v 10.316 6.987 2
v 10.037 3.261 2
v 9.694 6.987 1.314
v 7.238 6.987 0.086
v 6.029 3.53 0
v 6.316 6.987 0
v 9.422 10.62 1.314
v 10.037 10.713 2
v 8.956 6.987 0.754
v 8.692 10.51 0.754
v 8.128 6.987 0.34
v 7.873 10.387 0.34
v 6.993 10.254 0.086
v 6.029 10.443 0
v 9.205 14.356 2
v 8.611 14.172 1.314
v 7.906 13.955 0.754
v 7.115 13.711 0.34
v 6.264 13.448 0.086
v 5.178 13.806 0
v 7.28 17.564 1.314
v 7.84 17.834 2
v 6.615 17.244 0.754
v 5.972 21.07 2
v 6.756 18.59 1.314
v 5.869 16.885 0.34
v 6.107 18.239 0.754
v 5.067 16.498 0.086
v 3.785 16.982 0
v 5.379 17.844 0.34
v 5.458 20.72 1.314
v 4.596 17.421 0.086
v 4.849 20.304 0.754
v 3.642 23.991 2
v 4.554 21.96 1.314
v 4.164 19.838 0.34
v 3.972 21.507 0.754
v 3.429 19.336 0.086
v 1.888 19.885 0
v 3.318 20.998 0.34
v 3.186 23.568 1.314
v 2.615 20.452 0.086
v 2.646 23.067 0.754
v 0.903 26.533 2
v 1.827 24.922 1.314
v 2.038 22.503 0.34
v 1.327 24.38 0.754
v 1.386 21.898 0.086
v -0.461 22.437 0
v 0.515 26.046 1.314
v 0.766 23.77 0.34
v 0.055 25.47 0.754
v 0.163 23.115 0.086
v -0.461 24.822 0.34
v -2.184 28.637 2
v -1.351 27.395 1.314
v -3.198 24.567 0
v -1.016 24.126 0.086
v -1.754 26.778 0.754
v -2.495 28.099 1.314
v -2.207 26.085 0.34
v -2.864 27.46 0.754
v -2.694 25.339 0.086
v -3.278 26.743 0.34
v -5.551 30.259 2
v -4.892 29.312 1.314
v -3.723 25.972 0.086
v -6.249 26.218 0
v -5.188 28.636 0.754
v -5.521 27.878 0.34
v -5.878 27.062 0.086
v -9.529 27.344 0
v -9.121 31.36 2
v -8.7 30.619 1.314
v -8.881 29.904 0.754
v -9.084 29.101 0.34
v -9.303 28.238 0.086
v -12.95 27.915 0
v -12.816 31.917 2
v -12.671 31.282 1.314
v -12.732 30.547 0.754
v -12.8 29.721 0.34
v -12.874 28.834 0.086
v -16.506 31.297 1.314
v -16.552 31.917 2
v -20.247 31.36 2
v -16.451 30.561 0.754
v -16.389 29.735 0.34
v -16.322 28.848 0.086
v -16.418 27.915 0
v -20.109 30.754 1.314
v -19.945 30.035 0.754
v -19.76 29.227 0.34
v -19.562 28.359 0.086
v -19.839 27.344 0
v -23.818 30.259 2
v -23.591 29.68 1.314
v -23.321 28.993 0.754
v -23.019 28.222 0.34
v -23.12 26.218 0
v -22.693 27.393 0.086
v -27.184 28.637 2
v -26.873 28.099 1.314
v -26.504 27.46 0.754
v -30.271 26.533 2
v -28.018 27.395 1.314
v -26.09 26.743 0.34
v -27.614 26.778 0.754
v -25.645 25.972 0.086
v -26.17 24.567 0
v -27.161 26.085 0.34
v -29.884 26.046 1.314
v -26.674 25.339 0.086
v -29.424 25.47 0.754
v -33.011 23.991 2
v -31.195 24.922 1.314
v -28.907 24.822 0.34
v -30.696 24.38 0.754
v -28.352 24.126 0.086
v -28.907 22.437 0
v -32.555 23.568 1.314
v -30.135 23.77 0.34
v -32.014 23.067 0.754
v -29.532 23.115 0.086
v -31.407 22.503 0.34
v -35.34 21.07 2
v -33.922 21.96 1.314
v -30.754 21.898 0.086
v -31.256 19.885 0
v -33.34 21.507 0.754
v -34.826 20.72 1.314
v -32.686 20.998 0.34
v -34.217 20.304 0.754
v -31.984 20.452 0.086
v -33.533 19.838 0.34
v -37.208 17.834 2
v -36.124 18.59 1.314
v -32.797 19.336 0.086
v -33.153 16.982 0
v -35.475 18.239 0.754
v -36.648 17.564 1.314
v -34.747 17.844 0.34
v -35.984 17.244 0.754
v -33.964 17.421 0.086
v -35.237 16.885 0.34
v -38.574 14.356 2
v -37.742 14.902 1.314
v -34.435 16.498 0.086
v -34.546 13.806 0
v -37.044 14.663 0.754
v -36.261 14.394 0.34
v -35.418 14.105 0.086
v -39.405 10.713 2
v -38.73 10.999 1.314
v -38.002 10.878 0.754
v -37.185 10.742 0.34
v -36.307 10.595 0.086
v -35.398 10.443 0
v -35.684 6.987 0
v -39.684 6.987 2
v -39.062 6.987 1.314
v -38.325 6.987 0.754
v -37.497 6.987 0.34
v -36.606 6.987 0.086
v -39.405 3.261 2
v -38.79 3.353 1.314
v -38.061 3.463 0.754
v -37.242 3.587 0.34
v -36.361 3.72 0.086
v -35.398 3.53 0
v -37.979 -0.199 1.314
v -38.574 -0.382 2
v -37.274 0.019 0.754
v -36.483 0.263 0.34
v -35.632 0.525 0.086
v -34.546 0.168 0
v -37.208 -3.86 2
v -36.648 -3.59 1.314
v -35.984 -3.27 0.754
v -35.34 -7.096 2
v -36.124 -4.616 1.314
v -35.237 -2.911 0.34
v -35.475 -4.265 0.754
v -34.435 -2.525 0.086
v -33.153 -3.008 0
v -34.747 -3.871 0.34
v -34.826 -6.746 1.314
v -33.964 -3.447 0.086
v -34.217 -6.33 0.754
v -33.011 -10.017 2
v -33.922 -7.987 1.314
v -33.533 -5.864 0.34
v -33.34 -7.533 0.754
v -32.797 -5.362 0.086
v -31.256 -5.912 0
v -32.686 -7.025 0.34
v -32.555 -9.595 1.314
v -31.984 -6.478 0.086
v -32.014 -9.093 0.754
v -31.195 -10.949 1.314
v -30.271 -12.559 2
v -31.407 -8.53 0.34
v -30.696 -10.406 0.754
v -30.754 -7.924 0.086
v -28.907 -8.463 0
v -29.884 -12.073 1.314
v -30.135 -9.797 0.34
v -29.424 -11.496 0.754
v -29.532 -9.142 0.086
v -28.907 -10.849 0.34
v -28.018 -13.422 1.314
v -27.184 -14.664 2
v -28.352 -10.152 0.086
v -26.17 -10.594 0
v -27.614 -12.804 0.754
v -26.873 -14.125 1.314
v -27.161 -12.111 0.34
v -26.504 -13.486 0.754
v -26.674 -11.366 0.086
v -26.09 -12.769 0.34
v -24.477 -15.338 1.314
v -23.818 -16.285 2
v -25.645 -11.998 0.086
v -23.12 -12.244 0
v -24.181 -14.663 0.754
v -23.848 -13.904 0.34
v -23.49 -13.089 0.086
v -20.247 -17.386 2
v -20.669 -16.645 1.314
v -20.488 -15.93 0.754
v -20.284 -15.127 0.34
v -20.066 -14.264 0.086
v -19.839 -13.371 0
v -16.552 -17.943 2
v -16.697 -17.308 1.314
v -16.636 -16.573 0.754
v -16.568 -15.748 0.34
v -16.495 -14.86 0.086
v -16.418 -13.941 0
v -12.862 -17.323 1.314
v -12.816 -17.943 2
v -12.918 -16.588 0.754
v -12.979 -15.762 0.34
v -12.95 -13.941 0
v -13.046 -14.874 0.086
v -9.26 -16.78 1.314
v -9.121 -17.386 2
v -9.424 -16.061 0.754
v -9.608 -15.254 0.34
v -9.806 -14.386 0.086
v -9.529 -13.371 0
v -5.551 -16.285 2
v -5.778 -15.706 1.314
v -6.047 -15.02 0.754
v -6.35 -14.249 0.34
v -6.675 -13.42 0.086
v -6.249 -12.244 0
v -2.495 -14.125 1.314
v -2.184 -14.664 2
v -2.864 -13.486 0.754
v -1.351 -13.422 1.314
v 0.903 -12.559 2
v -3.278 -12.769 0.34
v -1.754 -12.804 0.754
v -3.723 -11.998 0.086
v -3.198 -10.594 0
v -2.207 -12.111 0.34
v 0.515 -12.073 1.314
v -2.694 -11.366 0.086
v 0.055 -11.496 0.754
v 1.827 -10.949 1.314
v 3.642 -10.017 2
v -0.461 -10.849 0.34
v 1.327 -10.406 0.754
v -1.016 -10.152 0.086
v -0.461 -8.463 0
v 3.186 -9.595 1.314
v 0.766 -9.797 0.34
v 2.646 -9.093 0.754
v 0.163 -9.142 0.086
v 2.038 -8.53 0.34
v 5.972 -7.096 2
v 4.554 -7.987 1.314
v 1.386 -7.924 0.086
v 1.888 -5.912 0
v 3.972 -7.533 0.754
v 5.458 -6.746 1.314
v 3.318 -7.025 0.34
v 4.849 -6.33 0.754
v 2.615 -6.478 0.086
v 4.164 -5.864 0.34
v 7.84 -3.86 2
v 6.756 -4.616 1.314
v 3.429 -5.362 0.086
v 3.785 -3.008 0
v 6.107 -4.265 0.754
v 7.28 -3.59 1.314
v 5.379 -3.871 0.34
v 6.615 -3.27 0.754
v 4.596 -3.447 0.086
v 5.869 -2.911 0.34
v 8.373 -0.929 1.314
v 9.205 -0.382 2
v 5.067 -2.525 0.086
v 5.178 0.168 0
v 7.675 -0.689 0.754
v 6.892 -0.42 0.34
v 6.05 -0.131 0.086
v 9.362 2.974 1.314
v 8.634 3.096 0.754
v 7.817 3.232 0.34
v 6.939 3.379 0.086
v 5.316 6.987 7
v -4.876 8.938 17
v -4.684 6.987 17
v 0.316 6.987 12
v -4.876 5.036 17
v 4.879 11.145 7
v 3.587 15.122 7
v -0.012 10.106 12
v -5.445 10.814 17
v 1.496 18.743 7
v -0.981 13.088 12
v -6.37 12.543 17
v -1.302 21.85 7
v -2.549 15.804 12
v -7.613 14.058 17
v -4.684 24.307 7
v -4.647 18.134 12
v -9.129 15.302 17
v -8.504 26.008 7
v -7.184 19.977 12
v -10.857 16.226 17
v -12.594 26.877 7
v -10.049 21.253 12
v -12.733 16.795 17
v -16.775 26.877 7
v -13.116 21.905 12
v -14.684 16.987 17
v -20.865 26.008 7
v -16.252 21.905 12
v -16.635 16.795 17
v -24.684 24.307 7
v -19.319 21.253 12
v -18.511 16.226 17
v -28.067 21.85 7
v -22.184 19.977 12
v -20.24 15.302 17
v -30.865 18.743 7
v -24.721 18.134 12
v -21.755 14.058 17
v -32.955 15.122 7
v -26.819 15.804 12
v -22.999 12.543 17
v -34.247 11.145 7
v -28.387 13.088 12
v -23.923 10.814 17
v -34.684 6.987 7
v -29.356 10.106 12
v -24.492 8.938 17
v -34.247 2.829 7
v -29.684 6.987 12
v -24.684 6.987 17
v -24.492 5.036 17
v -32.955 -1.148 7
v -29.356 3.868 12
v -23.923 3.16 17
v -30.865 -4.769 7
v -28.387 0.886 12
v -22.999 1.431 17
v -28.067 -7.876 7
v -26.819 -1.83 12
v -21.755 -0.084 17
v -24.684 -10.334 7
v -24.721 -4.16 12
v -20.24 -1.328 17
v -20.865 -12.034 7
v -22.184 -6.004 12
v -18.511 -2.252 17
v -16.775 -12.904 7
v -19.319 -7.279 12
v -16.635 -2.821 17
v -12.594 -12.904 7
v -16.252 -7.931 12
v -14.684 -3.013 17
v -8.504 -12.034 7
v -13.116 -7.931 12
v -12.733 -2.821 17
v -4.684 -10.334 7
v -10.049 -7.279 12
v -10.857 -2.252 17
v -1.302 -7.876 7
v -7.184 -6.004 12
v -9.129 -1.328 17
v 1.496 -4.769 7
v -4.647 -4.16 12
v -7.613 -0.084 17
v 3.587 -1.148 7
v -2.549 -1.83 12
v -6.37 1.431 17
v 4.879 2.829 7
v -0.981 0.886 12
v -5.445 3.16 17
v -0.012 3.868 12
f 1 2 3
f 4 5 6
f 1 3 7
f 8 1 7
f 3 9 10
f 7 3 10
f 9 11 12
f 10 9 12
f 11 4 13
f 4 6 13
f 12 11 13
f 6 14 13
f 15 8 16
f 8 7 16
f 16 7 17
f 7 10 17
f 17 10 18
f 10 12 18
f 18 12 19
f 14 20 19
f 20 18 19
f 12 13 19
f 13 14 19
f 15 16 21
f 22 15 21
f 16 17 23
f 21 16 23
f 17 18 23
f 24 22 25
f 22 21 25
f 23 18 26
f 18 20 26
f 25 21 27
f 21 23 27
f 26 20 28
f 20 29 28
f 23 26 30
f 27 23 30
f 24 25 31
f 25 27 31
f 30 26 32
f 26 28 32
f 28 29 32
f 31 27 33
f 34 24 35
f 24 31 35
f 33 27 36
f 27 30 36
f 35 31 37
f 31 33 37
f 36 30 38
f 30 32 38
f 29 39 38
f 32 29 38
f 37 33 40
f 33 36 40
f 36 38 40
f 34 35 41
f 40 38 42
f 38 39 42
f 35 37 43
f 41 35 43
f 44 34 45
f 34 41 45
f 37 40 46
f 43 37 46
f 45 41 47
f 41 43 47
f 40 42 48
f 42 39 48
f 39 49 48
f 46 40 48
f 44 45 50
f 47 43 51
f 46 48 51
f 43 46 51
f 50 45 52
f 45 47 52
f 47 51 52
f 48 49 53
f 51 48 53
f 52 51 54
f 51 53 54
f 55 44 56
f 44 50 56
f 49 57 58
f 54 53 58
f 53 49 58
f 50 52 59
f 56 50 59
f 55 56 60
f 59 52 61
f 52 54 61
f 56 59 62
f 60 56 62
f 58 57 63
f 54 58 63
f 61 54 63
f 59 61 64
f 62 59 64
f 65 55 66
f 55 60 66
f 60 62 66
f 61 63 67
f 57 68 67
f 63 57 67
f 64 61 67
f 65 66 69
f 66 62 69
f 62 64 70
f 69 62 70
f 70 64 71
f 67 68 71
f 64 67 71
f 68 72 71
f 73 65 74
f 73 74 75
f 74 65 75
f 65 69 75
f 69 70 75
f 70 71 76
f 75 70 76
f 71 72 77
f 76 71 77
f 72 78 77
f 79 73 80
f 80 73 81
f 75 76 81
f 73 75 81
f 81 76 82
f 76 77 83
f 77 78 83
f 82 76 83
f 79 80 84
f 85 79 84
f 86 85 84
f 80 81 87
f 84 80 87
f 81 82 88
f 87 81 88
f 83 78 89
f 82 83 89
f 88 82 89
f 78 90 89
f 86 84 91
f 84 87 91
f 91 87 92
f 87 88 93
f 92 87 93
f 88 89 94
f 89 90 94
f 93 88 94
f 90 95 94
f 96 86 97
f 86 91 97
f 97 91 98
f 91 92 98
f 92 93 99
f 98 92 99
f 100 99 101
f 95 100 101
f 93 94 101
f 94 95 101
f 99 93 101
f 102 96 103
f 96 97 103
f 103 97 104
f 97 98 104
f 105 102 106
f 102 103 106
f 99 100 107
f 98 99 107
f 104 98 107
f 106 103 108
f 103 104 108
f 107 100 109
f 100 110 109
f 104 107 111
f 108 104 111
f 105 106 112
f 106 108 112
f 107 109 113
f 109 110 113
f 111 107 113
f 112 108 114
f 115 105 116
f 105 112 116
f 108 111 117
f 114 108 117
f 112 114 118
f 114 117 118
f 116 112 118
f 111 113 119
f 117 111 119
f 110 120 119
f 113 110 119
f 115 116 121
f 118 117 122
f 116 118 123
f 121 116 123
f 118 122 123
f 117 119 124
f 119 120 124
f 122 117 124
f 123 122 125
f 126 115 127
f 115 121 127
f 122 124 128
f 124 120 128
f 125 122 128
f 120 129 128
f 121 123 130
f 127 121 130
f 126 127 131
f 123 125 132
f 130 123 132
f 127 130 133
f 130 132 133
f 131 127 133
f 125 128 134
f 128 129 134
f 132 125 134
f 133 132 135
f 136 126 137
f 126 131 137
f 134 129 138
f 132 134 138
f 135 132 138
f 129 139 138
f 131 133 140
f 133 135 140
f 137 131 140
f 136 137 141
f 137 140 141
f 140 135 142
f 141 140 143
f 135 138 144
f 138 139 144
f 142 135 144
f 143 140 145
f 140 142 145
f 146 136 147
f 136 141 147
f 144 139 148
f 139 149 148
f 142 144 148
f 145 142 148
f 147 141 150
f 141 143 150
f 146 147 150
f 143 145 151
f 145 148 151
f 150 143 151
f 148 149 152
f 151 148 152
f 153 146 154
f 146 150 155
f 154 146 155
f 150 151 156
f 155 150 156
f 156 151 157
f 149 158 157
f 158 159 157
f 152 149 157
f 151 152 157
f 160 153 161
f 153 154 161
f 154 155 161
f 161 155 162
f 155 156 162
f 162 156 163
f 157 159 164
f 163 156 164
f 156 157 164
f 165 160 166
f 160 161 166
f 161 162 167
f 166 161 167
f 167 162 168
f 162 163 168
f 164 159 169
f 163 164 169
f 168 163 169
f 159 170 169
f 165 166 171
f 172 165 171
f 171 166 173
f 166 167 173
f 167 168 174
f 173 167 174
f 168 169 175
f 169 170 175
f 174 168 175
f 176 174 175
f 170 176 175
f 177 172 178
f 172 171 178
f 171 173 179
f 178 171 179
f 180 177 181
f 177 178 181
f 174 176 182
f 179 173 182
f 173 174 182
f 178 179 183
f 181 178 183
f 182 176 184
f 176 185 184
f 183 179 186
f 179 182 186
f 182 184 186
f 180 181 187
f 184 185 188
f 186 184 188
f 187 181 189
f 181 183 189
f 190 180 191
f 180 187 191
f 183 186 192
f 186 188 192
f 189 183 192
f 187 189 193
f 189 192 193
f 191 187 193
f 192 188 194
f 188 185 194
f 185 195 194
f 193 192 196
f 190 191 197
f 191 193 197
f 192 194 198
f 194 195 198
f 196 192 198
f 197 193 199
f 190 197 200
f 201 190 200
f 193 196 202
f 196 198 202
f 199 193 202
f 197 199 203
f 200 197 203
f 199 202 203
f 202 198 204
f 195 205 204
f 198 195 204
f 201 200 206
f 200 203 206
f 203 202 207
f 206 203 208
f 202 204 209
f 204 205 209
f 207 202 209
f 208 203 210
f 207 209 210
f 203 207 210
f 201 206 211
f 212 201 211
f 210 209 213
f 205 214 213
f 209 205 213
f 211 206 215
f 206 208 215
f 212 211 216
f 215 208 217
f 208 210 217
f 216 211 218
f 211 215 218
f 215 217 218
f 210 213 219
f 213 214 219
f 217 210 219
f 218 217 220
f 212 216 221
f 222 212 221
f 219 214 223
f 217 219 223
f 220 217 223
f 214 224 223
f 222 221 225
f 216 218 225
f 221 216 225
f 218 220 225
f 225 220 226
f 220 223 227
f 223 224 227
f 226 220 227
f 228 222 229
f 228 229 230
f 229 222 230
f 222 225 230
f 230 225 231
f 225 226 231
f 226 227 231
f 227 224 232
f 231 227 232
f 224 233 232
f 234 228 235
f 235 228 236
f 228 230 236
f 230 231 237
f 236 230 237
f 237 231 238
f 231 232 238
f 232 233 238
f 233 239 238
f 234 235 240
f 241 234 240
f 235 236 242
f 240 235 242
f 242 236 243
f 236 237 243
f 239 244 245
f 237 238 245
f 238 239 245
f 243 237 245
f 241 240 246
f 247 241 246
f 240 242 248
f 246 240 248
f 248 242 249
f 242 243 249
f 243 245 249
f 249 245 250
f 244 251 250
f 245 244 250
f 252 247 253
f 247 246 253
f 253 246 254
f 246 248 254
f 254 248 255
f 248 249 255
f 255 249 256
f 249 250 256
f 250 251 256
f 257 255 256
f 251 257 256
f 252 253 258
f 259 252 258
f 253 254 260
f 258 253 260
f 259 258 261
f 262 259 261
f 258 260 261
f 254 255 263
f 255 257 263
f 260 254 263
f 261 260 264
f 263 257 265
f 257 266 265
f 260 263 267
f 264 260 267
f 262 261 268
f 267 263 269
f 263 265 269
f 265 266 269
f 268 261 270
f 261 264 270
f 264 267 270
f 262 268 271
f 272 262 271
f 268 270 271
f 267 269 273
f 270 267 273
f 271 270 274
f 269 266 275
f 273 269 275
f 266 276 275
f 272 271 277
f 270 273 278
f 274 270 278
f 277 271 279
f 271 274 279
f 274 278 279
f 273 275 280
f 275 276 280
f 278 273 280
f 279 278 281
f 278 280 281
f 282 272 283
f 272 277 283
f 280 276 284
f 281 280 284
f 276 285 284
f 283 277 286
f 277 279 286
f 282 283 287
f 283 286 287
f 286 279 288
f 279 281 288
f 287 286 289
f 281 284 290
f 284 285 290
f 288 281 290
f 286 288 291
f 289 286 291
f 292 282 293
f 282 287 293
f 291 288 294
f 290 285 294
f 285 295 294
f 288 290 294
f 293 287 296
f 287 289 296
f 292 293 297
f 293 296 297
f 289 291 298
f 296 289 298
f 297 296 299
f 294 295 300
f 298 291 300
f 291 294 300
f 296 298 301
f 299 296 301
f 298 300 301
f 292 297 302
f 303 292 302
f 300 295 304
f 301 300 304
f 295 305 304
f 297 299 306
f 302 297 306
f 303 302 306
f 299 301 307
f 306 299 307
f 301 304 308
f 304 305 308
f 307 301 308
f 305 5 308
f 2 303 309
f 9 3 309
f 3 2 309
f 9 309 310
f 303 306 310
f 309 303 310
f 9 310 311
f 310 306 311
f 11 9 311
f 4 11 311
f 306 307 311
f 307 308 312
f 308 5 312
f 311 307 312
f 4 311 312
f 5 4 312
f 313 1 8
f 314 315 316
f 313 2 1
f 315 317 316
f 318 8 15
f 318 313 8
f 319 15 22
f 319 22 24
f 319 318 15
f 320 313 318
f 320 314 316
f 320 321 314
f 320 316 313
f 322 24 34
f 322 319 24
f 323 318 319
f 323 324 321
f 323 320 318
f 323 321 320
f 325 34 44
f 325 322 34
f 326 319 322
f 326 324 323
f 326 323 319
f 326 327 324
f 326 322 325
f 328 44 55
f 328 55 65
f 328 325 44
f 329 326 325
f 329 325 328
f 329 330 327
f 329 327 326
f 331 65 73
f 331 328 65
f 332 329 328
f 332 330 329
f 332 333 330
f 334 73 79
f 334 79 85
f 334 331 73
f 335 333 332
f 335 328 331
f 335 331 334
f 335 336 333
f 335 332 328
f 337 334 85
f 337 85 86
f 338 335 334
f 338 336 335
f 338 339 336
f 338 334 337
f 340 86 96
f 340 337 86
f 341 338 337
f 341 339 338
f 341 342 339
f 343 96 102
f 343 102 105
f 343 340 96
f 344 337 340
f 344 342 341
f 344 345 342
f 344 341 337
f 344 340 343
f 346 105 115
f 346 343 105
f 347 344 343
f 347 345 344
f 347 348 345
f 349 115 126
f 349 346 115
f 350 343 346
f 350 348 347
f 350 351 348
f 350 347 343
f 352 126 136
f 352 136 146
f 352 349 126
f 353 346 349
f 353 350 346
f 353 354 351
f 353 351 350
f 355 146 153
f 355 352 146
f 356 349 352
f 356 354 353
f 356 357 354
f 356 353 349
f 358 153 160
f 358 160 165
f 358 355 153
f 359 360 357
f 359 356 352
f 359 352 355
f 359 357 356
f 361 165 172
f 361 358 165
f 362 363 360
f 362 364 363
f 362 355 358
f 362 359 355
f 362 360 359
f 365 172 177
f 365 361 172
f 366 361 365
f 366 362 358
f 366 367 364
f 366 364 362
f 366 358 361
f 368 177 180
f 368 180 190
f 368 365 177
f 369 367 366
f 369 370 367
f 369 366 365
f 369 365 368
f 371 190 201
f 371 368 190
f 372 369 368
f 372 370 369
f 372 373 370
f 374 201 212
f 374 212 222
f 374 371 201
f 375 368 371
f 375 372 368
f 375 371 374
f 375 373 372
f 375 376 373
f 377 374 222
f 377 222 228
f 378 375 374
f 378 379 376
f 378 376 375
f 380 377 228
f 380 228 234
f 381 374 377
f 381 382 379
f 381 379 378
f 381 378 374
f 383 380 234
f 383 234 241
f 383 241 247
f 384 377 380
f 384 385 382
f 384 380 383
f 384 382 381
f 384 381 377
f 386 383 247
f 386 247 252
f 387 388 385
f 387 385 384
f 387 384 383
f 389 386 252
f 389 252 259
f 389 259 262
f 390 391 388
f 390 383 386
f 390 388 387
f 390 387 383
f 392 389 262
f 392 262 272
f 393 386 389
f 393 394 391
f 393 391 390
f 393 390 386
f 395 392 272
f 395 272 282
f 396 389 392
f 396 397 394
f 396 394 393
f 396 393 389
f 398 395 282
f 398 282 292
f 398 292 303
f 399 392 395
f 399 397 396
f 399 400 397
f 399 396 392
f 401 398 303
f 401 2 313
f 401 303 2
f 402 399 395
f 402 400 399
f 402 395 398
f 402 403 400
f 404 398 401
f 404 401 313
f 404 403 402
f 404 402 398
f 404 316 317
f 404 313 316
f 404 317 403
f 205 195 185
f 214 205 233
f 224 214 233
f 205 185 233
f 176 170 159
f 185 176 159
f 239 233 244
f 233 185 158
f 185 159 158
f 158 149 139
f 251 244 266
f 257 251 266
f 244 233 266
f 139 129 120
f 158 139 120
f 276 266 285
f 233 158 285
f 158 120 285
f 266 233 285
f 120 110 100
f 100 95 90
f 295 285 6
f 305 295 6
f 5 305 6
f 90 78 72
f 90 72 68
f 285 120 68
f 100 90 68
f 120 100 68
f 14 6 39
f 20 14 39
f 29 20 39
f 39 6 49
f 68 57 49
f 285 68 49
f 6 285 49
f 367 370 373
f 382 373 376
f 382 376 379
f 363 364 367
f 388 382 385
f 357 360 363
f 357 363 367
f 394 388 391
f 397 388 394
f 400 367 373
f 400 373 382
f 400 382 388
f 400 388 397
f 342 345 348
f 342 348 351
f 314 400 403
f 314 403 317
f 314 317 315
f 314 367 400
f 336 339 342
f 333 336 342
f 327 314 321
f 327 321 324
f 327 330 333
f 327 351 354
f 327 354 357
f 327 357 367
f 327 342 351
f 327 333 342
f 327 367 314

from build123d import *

# Parameters (mm, degrees)
F0_R     = 25
F1_DEPTH = 17
F2_SIZE  = 15


# Not quite as in the source:
# - a fillet or chamfer that OpenCascade refuses, or shapes differently, is made with other operations: its cross-section is extruded or revolved along the edge and cut away or added


with BuildPart() as f1:
    # F0 (on Top) → F1 (new body)
    with BuildSketch(Plane.XY):
        with Locations((-14.6842114627, 6.9868424907)):
            Circle(F0_R)
    extrude(amount=F1_DEPTH)

    # F2
    f2_edges = [f1.edges().sort_by_distance(p)[0] for p in [
        (-39.684211, 6.986842, 17),
    ]]
    chamfer(f2_edges, length=F2_SIZE)

    # F3: fillet of radius 5 on 1 edges, made by hand

    # F3_s1 → F3_t2 (revolve, cut)
    with BuildSketch(Plane.XZ.offset(-6.9868424907)):
        with BuildLine():
            ThreePointArc((10.3157885373, 2), (8.5518565148, 0.527864045), (6.3157885373, 0))
            Line((6.3157885373, 0), (10.3157885373, 0))
            Line((10.3157885373, 0), (10.3157885373, 2))
        make_face()
    revolve(axis=Axis((-14.6842114627, 6.9868424907, 0), (0, 0, 1)), mode=Mode.SUBTRACT)


solid = f1.part
